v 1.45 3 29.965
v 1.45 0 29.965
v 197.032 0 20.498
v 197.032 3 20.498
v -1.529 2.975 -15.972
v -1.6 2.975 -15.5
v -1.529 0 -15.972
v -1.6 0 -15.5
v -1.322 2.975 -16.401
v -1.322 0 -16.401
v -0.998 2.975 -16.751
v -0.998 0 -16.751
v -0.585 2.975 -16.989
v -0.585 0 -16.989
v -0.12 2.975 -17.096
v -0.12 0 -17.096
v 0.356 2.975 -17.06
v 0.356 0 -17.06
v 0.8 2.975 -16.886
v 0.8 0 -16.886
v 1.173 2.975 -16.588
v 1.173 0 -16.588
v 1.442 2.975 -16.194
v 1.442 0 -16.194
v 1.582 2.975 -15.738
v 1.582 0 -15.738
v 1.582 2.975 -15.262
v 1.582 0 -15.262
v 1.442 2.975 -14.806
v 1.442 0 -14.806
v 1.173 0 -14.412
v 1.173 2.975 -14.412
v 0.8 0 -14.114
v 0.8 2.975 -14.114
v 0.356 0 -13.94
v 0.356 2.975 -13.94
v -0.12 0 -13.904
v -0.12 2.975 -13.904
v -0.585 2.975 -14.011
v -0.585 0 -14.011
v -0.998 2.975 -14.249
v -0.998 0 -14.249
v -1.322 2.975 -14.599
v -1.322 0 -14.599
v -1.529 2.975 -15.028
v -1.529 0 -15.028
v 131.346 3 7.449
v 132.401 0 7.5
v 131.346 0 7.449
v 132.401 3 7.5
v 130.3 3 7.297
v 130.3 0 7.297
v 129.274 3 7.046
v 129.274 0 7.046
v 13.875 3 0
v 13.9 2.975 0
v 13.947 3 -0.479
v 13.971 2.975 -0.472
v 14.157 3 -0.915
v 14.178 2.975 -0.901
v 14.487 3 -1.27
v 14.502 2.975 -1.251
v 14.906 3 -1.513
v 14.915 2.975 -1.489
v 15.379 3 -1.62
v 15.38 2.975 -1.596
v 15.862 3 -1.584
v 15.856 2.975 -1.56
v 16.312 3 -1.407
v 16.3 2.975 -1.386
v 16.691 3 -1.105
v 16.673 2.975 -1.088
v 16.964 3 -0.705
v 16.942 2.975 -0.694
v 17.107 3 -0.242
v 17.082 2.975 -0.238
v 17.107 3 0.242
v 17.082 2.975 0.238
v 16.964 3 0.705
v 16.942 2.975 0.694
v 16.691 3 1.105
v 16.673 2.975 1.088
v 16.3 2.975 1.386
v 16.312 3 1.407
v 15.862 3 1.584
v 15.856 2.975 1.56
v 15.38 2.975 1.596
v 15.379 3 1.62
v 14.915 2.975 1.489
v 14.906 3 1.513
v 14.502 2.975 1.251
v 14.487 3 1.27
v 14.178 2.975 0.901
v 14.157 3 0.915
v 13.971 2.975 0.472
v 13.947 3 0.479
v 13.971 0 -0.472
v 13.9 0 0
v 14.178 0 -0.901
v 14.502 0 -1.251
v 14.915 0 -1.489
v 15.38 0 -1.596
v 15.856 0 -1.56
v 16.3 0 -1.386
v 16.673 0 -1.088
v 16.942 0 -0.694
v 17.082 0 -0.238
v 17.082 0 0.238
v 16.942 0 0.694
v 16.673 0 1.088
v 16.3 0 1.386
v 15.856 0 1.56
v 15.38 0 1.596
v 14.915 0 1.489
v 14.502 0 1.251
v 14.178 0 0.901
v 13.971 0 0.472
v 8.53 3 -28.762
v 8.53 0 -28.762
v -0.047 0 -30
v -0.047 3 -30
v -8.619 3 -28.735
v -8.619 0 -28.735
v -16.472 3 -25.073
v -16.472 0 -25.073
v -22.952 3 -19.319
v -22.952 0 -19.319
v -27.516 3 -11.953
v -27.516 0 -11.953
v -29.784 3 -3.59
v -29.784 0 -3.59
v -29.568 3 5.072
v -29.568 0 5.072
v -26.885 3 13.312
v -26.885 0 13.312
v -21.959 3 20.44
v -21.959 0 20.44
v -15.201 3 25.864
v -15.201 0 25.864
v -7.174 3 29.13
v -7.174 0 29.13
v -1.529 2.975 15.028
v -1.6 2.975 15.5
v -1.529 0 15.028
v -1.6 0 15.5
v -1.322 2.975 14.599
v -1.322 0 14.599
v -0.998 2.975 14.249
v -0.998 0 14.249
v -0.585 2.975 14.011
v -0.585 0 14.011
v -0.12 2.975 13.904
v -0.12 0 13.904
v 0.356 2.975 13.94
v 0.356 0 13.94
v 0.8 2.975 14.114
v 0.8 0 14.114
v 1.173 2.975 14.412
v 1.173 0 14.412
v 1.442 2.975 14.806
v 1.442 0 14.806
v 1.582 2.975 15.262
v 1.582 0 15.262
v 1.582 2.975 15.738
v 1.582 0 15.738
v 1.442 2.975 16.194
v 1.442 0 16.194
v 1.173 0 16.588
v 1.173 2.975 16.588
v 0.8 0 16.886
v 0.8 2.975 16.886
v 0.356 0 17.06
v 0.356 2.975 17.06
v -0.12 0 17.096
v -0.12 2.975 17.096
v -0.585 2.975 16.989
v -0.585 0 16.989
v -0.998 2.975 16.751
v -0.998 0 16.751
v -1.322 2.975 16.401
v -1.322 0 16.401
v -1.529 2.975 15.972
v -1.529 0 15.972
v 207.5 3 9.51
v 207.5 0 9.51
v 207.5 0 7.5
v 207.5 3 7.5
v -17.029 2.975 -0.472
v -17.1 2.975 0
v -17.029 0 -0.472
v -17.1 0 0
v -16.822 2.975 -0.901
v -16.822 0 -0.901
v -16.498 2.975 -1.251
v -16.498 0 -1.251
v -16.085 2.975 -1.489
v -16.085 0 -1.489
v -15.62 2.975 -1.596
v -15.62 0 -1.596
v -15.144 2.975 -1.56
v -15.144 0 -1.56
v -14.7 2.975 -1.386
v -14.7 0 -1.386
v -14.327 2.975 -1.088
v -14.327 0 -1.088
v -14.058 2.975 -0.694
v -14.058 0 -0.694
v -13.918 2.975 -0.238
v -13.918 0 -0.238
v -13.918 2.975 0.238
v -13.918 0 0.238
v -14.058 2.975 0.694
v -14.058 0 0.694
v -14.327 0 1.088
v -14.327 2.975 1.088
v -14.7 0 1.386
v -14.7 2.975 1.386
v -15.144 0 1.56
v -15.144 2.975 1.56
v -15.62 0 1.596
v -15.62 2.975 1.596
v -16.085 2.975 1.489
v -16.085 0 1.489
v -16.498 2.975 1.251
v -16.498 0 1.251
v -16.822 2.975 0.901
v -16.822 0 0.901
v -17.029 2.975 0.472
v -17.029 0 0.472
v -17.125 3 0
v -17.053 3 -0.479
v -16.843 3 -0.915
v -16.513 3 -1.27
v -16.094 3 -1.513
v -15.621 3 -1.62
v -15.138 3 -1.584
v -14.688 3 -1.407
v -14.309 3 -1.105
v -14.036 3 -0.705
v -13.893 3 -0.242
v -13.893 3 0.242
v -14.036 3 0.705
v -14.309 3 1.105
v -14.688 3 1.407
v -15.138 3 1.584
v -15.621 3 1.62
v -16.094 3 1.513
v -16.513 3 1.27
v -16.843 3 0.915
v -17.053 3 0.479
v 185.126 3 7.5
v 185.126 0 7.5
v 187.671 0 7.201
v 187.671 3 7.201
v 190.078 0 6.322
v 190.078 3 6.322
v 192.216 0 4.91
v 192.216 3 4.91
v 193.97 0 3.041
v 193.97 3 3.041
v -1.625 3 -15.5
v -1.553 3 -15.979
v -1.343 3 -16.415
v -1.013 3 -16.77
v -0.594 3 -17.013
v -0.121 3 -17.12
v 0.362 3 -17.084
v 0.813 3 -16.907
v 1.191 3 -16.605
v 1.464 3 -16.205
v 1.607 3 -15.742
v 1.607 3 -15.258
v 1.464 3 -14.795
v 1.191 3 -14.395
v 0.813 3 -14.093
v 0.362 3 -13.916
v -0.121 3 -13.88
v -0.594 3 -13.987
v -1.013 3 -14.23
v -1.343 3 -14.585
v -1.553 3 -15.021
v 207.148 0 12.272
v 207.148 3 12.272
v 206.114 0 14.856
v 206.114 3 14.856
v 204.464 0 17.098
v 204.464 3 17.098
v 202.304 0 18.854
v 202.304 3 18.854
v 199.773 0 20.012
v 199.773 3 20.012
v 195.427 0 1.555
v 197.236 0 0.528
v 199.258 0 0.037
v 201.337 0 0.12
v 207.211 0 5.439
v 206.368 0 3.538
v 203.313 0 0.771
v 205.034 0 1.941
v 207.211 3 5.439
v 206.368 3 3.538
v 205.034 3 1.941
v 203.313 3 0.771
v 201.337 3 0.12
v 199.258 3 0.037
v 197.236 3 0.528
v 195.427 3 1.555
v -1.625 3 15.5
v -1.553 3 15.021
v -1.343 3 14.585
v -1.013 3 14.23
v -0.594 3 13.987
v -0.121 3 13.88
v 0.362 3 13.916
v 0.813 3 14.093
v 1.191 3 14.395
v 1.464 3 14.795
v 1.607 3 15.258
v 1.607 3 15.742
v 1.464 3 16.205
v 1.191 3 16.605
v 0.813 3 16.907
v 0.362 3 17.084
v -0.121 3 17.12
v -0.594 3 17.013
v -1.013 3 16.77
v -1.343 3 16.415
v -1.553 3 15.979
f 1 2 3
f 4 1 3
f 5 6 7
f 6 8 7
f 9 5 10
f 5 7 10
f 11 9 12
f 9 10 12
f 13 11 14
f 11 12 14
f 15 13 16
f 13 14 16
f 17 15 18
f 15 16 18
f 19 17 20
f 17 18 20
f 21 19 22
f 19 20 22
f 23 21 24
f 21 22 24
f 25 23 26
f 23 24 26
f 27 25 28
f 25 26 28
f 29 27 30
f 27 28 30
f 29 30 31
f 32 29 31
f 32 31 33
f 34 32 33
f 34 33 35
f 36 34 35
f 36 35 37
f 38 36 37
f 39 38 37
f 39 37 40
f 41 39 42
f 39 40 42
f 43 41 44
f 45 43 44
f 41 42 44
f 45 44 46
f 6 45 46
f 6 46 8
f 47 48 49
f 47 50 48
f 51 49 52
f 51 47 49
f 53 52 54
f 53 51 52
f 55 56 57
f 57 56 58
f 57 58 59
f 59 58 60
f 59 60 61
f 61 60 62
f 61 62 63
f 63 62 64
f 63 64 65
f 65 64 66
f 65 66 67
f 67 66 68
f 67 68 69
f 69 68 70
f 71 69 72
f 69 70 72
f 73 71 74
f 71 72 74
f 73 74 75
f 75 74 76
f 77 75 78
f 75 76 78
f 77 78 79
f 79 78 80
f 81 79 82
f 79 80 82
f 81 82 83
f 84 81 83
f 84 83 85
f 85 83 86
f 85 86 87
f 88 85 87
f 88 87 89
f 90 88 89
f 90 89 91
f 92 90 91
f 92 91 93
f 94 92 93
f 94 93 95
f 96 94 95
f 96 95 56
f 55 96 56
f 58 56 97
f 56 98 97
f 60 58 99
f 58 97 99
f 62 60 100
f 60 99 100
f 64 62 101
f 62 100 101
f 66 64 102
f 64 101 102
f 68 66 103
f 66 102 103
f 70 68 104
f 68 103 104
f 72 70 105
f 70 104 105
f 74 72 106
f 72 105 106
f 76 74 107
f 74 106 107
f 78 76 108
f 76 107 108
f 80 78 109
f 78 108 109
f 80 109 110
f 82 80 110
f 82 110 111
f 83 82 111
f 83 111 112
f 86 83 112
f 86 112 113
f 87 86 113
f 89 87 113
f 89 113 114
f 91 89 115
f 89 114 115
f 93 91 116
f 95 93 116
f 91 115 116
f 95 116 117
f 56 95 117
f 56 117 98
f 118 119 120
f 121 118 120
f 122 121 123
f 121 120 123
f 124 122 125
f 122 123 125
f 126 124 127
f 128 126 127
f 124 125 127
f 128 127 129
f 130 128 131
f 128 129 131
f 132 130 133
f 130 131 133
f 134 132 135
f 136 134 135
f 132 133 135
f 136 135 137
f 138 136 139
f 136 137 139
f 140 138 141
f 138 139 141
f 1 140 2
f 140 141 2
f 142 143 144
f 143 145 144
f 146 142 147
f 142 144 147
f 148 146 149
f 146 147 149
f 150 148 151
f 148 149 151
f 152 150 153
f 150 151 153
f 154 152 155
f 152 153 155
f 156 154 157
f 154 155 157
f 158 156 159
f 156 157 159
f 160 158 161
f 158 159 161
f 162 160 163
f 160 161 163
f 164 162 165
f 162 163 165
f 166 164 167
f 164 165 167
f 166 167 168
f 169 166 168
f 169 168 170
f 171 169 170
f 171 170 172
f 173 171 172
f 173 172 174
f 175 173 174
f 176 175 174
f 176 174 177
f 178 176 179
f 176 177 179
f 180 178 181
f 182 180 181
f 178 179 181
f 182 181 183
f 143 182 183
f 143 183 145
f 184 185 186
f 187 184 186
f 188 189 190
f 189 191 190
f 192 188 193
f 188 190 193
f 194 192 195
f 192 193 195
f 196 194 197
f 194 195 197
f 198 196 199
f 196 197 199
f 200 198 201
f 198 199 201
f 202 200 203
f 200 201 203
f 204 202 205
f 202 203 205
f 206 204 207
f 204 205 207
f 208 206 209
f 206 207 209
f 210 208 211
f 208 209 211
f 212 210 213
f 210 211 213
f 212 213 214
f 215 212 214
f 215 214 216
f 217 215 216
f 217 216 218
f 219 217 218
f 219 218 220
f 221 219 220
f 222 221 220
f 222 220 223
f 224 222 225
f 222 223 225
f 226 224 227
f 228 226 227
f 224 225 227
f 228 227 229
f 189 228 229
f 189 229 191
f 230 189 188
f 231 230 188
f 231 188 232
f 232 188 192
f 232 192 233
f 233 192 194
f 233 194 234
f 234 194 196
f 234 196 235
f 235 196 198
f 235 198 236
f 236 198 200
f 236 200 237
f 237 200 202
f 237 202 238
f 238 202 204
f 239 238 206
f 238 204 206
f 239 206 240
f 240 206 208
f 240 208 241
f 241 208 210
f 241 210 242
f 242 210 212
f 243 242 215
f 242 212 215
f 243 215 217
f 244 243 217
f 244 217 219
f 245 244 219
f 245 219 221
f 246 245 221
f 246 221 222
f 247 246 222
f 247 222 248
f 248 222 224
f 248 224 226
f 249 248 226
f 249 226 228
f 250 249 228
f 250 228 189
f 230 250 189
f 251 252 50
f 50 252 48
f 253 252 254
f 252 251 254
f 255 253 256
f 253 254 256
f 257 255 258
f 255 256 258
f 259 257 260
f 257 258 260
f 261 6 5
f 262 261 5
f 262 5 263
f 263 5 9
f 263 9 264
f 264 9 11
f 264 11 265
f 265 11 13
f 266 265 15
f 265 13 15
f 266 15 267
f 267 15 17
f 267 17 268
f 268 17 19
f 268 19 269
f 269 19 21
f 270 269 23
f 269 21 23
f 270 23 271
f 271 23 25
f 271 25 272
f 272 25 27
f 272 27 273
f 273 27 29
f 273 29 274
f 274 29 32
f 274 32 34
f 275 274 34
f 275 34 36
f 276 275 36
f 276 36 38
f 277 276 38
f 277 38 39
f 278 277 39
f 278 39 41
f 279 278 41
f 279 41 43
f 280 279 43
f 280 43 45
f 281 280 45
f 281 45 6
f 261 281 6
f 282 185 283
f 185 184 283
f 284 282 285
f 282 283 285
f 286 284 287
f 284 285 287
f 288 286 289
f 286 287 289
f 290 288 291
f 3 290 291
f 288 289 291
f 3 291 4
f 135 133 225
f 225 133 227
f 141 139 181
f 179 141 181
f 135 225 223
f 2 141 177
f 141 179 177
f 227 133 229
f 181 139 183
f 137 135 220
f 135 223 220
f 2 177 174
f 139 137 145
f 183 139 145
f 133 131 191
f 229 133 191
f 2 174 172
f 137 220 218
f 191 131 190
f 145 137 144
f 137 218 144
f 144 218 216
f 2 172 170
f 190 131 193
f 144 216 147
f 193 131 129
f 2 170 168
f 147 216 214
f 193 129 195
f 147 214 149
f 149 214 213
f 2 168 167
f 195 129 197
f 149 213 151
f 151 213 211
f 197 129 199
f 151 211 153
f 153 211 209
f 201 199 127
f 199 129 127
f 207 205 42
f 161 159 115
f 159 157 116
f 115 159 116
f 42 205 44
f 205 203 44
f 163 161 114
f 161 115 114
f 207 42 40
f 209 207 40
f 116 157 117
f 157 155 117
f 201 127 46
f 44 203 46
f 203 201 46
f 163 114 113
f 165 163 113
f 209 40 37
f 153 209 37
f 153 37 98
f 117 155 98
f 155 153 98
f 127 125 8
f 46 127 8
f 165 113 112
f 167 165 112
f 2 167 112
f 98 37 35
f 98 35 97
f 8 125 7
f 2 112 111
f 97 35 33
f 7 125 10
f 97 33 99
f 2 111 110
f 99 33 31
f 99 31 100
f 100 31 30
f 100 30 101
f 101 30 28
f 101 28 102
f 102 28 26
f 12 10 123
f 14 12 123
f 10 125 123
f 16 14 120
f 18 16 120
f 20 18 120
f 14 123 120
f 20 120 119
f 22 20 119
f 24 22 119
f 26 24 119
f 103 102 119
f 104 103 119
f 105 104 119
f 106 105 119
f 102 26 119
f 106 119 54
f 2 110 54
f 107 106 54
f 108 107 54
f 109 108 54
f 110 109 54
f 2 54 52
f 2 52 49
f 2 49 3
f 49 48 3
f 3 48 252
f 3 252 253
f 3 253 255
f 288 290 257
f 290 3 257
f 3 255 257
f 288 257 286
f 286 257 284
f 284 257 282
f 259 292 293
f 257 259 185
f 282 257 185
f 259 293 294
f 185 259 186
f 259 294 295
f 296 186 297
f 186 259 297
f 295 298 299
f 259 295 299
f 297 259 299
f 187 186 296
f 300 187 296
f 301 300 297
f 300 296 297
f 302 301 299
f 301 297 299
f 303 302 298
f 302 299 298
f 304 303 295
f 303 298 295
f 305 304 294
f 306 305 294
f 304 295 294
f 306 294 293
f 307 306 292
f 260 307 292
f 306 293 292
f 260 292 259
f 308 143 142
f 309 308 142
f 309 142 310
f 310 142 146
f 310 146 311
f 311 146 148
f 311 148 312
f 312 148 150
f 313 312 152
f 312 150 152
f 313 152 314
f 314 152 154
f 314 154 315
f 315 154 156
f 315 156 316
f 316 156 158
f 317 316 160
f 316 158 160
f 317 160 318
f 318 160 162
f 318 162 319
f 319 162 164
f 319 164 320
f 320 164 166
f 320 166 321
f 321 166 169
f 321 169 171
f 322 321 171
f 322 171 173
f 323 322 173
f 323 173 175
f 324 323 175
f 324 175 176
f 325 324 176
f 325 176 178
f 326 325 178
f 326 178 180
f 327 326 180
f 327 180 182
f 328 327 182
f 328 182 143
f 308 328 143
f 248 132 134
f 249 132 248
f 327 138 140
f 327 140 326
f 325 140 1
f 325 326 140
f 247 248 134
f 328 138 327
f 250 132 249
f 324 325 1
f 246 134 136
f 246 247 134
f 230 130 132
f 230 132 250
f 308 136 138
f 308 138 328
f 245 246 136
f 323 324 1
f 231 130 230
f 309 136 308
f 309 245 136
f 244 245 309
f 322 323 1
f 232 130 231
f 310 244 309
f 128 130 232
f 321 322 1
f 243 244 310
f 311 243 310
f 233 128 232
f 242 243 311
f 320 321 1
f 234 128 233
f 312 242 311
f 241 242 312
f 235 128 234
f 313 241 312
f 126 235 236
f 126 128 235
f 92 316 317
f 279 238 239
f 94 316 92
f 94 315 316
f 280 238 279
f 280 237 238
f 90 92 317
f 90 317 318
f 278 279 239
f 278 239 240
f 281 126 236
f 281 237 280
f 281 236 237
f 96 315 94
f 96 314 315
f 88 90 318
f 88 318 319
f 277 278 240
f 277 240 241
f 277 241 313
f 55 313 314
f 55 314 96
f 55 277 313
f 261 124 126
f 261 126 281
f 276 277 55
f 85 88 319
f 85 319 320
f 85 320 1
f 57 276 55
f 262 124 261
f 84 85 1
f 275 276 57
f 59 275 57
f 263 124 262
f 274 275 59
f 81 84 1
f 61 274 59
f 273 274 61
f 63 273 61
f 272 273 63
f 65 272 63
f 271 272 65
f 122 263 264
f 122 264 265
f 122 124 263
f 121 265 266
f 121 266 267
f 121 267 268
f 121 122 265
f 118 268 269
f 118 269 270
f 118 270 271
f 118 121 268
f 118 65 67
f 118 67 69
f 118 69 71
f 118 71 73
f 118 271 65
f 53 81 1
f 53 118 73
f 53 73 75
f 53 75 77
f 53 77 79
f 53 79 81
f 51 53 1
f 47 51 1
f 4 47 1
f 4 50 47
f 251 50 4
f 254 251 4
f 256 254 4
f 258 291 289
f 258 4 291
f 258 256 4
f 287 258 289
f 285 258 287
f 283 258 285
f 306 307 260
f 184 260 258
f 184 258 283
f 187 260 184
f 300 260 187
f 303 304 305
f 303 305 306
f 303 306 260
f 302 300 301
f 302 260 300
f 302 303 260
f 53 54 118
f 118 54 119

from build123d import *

# Parameters (mm, degrees)
BOSS_EXTRUDE1_DEPTH            = 3
M3_CLEARANCE_HOLE1_D           = 3.2
M3_CLEARANCE_HOLE1_CSINK_D     = 3.25
M3_CLEARANCE_HOLE1_CSINK_ANGLE = 90
FILLET2_R                      = 11


with BuildPart() as part:
    # Sketch1 → Boss-Extrude1 (new body)
    with BuildSketch(Plane(origin=(0, 0, 0), x_dir=(1, 0, 0), z_dir=(0, 1, 0))):
        with BuildLine():
            ThreePointArc((8.529623766, 28.761876128), (-29.78438528, 3.590319411), (1.450480292, -29.964914599))
            Line((1.450480292, -29.964914599), (207.5, -19.990892525))
            Line((207.5, -19.990892525), (207.5, -7.5))
            ThreePointArc((207.5, -7.5), (200, 0), (192.5, -7.5))
            Line((192.5, -7.5), (130.80460541, -7.5))
            Line((130.80460541, -7.5), (8.529623766, 28.761876128))
        make_face()
    extrude(amount=BOSS_EXTRUDE1_DEPTH)

    # M3 Clearance Hole1 (through all)
    with Locations(Plane(origin=(0, 3, 0), x_dir=(1, 0, 0), z_dir=(0, 1, 0))):
        with Locations((-15.5, 0), (0, 15.5), (15.5, 0), (0, -15.5)):
            CounterSinkHole(M3_CLEARANCE_HOLE1_D / 2, M3_CLEARANCE_HOLE1_CSINK_D / 2, counter_sink_angle=M3_CLEARANCE_HOLE1_CSINK_ANGLE)

    # Fillet2
    fillet2_edges = [part.edges().sort_by_distance(p)[0] for p in [
        (130.80460541, 1.5, 7.5),
        (192.5, 1.5, 7.5),
        (207.5, 1.5, 19.990892525),
    ]]
    fillet(fillet2_edges, radius=FILLET2_R)


solid = part.part
